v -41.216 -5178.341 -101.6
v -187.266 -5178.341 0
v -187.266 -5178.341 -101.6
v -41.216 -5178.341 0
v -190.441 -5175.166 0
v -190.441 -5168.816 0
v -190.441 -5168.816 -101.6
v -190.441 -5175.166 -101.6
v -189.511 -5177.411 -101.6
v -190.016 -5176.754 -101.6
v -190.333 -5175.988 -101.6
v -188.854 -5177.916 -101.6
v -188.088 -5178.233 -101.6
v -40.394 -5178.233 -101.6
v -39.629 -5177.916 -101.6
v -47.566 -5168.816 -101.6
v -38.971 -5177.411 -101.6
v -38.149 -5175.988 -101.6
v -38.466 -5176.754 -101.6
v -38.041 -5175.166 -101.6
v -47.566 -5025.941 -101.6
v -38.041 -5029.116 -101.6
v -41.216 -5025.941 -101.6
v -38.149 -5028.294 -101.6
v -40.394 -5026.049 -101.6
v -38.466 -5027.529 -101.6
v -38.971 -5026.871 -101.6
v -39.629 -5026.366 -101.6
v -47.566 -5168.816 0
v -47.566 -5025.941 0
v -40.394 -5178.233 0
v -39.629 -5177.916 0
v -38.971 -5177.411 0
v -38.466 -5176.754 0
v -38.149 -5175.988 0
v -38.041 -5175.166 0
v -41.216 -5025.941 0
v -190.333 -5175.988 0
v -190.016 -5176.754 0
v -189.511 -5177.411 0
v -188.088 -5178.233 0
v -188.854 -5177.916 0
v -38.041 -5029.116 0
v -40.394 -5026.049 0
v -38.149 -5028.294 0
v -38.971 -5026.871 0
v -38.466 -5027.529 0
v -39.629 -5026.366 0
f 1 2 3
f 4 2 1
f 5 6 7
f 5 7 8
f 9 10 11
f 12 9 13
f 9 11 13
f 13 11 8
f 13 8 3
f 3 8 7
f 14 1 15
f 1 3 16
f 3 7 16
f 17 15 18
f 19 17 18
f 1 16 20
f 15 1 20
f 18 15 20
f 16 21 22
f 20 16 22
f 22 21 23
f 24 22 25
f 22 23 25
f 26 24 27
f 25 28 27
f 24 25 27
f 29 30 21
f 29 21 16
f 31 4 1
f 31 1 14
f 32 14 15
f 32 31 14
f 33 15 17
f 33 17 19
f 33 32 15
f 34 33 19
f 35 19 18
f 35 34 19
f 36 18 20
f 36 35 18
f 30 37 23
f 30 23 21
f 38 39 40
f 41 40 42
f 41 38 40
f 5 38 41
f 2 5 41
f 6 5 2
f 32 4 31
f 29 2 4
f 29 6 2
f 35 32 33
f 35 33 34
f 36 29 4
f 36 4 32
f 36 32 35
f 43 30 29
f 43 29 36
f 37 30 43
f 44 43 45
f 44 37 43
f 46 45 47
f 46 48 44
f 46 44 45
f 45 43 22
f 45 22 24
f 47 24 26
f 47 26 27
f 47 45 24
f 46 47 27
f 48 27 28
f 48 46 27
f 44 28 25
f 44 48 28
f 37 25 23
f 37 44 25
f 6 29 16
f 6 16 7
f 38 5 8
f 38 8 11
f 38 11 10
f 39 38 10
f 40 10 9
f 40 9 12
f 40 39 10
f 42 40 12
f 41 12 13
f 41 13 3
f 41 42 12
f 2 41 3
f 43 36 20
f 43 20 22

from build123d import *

# Parameters (mm, degrees)
BOSS_EXTRUDE1_DEPTH = 101.6


with BuildPart() as part:
    # Sketch1 → Boss-Extrude1 (new body)
    with BuildSketch(Plane.XY):
        with BuildLine():
            Line((-101.6, -5178.34108), (-101.6, -5168.81608))
            Line((-101.6, -5168.81608), (-190.441035714, -5168.81608))
            Line((-190.441035714, -5168.81608), (-190.441035714, -5175.16608))
            ThreePointArc((-190.441035714, -5175.16608), (-189.511099745, -5177.41114403), (-187.266035714, -5178.34108))
            Line((-187.266035714, -5178.34108), (-101.6, -5178.34108))
        make_face()
        with BuildLine():
            Line((-38.041035714, -5168.81608), (-47.566035714, -5168.81608))
            Line((-47.566035714, -5168.81608), (-53.408035714, -5168.81608))
            Line((-53.408035714, -5168.81608), (-101.6, -5168.81608))
            Line((-101.6, -5168.81608), (-101.6, -5178.34108))
            Line((-101.6, -5178.34108), (-41.216035714, -5178.34108))
            ThreePointArc((-41.216035714, -5178.34108), (-38.970971684, -5177.41114403), (-38.041035714, -5175.16608))
            Line((-38.041035714, -5175.16608), (-38.041035714, -5168.81608))
        make_face()
        with BuildLine():
            Line((-47.566035714, -5025.94108), (-47.566035714, -5168.81608))
            Line((-47.566035714, -5168.81608), (-38.041035714, -5168.81608))
            Line((-38.041035714, -5168.81608), (-38.041035714, -5029.11608))
            ThreePointArc((-38.041035714, -5029.11608), (-38.970971684, -5026.87101597), (-41.216035714, -5025.94108))
            Line((-41.216035714, -5025.94108), (-47.566035714, -5025.94108))
        make_face()
    extrude(amount=-BOSS_EXTRUDE1_DEPTH)


solid = part.part
